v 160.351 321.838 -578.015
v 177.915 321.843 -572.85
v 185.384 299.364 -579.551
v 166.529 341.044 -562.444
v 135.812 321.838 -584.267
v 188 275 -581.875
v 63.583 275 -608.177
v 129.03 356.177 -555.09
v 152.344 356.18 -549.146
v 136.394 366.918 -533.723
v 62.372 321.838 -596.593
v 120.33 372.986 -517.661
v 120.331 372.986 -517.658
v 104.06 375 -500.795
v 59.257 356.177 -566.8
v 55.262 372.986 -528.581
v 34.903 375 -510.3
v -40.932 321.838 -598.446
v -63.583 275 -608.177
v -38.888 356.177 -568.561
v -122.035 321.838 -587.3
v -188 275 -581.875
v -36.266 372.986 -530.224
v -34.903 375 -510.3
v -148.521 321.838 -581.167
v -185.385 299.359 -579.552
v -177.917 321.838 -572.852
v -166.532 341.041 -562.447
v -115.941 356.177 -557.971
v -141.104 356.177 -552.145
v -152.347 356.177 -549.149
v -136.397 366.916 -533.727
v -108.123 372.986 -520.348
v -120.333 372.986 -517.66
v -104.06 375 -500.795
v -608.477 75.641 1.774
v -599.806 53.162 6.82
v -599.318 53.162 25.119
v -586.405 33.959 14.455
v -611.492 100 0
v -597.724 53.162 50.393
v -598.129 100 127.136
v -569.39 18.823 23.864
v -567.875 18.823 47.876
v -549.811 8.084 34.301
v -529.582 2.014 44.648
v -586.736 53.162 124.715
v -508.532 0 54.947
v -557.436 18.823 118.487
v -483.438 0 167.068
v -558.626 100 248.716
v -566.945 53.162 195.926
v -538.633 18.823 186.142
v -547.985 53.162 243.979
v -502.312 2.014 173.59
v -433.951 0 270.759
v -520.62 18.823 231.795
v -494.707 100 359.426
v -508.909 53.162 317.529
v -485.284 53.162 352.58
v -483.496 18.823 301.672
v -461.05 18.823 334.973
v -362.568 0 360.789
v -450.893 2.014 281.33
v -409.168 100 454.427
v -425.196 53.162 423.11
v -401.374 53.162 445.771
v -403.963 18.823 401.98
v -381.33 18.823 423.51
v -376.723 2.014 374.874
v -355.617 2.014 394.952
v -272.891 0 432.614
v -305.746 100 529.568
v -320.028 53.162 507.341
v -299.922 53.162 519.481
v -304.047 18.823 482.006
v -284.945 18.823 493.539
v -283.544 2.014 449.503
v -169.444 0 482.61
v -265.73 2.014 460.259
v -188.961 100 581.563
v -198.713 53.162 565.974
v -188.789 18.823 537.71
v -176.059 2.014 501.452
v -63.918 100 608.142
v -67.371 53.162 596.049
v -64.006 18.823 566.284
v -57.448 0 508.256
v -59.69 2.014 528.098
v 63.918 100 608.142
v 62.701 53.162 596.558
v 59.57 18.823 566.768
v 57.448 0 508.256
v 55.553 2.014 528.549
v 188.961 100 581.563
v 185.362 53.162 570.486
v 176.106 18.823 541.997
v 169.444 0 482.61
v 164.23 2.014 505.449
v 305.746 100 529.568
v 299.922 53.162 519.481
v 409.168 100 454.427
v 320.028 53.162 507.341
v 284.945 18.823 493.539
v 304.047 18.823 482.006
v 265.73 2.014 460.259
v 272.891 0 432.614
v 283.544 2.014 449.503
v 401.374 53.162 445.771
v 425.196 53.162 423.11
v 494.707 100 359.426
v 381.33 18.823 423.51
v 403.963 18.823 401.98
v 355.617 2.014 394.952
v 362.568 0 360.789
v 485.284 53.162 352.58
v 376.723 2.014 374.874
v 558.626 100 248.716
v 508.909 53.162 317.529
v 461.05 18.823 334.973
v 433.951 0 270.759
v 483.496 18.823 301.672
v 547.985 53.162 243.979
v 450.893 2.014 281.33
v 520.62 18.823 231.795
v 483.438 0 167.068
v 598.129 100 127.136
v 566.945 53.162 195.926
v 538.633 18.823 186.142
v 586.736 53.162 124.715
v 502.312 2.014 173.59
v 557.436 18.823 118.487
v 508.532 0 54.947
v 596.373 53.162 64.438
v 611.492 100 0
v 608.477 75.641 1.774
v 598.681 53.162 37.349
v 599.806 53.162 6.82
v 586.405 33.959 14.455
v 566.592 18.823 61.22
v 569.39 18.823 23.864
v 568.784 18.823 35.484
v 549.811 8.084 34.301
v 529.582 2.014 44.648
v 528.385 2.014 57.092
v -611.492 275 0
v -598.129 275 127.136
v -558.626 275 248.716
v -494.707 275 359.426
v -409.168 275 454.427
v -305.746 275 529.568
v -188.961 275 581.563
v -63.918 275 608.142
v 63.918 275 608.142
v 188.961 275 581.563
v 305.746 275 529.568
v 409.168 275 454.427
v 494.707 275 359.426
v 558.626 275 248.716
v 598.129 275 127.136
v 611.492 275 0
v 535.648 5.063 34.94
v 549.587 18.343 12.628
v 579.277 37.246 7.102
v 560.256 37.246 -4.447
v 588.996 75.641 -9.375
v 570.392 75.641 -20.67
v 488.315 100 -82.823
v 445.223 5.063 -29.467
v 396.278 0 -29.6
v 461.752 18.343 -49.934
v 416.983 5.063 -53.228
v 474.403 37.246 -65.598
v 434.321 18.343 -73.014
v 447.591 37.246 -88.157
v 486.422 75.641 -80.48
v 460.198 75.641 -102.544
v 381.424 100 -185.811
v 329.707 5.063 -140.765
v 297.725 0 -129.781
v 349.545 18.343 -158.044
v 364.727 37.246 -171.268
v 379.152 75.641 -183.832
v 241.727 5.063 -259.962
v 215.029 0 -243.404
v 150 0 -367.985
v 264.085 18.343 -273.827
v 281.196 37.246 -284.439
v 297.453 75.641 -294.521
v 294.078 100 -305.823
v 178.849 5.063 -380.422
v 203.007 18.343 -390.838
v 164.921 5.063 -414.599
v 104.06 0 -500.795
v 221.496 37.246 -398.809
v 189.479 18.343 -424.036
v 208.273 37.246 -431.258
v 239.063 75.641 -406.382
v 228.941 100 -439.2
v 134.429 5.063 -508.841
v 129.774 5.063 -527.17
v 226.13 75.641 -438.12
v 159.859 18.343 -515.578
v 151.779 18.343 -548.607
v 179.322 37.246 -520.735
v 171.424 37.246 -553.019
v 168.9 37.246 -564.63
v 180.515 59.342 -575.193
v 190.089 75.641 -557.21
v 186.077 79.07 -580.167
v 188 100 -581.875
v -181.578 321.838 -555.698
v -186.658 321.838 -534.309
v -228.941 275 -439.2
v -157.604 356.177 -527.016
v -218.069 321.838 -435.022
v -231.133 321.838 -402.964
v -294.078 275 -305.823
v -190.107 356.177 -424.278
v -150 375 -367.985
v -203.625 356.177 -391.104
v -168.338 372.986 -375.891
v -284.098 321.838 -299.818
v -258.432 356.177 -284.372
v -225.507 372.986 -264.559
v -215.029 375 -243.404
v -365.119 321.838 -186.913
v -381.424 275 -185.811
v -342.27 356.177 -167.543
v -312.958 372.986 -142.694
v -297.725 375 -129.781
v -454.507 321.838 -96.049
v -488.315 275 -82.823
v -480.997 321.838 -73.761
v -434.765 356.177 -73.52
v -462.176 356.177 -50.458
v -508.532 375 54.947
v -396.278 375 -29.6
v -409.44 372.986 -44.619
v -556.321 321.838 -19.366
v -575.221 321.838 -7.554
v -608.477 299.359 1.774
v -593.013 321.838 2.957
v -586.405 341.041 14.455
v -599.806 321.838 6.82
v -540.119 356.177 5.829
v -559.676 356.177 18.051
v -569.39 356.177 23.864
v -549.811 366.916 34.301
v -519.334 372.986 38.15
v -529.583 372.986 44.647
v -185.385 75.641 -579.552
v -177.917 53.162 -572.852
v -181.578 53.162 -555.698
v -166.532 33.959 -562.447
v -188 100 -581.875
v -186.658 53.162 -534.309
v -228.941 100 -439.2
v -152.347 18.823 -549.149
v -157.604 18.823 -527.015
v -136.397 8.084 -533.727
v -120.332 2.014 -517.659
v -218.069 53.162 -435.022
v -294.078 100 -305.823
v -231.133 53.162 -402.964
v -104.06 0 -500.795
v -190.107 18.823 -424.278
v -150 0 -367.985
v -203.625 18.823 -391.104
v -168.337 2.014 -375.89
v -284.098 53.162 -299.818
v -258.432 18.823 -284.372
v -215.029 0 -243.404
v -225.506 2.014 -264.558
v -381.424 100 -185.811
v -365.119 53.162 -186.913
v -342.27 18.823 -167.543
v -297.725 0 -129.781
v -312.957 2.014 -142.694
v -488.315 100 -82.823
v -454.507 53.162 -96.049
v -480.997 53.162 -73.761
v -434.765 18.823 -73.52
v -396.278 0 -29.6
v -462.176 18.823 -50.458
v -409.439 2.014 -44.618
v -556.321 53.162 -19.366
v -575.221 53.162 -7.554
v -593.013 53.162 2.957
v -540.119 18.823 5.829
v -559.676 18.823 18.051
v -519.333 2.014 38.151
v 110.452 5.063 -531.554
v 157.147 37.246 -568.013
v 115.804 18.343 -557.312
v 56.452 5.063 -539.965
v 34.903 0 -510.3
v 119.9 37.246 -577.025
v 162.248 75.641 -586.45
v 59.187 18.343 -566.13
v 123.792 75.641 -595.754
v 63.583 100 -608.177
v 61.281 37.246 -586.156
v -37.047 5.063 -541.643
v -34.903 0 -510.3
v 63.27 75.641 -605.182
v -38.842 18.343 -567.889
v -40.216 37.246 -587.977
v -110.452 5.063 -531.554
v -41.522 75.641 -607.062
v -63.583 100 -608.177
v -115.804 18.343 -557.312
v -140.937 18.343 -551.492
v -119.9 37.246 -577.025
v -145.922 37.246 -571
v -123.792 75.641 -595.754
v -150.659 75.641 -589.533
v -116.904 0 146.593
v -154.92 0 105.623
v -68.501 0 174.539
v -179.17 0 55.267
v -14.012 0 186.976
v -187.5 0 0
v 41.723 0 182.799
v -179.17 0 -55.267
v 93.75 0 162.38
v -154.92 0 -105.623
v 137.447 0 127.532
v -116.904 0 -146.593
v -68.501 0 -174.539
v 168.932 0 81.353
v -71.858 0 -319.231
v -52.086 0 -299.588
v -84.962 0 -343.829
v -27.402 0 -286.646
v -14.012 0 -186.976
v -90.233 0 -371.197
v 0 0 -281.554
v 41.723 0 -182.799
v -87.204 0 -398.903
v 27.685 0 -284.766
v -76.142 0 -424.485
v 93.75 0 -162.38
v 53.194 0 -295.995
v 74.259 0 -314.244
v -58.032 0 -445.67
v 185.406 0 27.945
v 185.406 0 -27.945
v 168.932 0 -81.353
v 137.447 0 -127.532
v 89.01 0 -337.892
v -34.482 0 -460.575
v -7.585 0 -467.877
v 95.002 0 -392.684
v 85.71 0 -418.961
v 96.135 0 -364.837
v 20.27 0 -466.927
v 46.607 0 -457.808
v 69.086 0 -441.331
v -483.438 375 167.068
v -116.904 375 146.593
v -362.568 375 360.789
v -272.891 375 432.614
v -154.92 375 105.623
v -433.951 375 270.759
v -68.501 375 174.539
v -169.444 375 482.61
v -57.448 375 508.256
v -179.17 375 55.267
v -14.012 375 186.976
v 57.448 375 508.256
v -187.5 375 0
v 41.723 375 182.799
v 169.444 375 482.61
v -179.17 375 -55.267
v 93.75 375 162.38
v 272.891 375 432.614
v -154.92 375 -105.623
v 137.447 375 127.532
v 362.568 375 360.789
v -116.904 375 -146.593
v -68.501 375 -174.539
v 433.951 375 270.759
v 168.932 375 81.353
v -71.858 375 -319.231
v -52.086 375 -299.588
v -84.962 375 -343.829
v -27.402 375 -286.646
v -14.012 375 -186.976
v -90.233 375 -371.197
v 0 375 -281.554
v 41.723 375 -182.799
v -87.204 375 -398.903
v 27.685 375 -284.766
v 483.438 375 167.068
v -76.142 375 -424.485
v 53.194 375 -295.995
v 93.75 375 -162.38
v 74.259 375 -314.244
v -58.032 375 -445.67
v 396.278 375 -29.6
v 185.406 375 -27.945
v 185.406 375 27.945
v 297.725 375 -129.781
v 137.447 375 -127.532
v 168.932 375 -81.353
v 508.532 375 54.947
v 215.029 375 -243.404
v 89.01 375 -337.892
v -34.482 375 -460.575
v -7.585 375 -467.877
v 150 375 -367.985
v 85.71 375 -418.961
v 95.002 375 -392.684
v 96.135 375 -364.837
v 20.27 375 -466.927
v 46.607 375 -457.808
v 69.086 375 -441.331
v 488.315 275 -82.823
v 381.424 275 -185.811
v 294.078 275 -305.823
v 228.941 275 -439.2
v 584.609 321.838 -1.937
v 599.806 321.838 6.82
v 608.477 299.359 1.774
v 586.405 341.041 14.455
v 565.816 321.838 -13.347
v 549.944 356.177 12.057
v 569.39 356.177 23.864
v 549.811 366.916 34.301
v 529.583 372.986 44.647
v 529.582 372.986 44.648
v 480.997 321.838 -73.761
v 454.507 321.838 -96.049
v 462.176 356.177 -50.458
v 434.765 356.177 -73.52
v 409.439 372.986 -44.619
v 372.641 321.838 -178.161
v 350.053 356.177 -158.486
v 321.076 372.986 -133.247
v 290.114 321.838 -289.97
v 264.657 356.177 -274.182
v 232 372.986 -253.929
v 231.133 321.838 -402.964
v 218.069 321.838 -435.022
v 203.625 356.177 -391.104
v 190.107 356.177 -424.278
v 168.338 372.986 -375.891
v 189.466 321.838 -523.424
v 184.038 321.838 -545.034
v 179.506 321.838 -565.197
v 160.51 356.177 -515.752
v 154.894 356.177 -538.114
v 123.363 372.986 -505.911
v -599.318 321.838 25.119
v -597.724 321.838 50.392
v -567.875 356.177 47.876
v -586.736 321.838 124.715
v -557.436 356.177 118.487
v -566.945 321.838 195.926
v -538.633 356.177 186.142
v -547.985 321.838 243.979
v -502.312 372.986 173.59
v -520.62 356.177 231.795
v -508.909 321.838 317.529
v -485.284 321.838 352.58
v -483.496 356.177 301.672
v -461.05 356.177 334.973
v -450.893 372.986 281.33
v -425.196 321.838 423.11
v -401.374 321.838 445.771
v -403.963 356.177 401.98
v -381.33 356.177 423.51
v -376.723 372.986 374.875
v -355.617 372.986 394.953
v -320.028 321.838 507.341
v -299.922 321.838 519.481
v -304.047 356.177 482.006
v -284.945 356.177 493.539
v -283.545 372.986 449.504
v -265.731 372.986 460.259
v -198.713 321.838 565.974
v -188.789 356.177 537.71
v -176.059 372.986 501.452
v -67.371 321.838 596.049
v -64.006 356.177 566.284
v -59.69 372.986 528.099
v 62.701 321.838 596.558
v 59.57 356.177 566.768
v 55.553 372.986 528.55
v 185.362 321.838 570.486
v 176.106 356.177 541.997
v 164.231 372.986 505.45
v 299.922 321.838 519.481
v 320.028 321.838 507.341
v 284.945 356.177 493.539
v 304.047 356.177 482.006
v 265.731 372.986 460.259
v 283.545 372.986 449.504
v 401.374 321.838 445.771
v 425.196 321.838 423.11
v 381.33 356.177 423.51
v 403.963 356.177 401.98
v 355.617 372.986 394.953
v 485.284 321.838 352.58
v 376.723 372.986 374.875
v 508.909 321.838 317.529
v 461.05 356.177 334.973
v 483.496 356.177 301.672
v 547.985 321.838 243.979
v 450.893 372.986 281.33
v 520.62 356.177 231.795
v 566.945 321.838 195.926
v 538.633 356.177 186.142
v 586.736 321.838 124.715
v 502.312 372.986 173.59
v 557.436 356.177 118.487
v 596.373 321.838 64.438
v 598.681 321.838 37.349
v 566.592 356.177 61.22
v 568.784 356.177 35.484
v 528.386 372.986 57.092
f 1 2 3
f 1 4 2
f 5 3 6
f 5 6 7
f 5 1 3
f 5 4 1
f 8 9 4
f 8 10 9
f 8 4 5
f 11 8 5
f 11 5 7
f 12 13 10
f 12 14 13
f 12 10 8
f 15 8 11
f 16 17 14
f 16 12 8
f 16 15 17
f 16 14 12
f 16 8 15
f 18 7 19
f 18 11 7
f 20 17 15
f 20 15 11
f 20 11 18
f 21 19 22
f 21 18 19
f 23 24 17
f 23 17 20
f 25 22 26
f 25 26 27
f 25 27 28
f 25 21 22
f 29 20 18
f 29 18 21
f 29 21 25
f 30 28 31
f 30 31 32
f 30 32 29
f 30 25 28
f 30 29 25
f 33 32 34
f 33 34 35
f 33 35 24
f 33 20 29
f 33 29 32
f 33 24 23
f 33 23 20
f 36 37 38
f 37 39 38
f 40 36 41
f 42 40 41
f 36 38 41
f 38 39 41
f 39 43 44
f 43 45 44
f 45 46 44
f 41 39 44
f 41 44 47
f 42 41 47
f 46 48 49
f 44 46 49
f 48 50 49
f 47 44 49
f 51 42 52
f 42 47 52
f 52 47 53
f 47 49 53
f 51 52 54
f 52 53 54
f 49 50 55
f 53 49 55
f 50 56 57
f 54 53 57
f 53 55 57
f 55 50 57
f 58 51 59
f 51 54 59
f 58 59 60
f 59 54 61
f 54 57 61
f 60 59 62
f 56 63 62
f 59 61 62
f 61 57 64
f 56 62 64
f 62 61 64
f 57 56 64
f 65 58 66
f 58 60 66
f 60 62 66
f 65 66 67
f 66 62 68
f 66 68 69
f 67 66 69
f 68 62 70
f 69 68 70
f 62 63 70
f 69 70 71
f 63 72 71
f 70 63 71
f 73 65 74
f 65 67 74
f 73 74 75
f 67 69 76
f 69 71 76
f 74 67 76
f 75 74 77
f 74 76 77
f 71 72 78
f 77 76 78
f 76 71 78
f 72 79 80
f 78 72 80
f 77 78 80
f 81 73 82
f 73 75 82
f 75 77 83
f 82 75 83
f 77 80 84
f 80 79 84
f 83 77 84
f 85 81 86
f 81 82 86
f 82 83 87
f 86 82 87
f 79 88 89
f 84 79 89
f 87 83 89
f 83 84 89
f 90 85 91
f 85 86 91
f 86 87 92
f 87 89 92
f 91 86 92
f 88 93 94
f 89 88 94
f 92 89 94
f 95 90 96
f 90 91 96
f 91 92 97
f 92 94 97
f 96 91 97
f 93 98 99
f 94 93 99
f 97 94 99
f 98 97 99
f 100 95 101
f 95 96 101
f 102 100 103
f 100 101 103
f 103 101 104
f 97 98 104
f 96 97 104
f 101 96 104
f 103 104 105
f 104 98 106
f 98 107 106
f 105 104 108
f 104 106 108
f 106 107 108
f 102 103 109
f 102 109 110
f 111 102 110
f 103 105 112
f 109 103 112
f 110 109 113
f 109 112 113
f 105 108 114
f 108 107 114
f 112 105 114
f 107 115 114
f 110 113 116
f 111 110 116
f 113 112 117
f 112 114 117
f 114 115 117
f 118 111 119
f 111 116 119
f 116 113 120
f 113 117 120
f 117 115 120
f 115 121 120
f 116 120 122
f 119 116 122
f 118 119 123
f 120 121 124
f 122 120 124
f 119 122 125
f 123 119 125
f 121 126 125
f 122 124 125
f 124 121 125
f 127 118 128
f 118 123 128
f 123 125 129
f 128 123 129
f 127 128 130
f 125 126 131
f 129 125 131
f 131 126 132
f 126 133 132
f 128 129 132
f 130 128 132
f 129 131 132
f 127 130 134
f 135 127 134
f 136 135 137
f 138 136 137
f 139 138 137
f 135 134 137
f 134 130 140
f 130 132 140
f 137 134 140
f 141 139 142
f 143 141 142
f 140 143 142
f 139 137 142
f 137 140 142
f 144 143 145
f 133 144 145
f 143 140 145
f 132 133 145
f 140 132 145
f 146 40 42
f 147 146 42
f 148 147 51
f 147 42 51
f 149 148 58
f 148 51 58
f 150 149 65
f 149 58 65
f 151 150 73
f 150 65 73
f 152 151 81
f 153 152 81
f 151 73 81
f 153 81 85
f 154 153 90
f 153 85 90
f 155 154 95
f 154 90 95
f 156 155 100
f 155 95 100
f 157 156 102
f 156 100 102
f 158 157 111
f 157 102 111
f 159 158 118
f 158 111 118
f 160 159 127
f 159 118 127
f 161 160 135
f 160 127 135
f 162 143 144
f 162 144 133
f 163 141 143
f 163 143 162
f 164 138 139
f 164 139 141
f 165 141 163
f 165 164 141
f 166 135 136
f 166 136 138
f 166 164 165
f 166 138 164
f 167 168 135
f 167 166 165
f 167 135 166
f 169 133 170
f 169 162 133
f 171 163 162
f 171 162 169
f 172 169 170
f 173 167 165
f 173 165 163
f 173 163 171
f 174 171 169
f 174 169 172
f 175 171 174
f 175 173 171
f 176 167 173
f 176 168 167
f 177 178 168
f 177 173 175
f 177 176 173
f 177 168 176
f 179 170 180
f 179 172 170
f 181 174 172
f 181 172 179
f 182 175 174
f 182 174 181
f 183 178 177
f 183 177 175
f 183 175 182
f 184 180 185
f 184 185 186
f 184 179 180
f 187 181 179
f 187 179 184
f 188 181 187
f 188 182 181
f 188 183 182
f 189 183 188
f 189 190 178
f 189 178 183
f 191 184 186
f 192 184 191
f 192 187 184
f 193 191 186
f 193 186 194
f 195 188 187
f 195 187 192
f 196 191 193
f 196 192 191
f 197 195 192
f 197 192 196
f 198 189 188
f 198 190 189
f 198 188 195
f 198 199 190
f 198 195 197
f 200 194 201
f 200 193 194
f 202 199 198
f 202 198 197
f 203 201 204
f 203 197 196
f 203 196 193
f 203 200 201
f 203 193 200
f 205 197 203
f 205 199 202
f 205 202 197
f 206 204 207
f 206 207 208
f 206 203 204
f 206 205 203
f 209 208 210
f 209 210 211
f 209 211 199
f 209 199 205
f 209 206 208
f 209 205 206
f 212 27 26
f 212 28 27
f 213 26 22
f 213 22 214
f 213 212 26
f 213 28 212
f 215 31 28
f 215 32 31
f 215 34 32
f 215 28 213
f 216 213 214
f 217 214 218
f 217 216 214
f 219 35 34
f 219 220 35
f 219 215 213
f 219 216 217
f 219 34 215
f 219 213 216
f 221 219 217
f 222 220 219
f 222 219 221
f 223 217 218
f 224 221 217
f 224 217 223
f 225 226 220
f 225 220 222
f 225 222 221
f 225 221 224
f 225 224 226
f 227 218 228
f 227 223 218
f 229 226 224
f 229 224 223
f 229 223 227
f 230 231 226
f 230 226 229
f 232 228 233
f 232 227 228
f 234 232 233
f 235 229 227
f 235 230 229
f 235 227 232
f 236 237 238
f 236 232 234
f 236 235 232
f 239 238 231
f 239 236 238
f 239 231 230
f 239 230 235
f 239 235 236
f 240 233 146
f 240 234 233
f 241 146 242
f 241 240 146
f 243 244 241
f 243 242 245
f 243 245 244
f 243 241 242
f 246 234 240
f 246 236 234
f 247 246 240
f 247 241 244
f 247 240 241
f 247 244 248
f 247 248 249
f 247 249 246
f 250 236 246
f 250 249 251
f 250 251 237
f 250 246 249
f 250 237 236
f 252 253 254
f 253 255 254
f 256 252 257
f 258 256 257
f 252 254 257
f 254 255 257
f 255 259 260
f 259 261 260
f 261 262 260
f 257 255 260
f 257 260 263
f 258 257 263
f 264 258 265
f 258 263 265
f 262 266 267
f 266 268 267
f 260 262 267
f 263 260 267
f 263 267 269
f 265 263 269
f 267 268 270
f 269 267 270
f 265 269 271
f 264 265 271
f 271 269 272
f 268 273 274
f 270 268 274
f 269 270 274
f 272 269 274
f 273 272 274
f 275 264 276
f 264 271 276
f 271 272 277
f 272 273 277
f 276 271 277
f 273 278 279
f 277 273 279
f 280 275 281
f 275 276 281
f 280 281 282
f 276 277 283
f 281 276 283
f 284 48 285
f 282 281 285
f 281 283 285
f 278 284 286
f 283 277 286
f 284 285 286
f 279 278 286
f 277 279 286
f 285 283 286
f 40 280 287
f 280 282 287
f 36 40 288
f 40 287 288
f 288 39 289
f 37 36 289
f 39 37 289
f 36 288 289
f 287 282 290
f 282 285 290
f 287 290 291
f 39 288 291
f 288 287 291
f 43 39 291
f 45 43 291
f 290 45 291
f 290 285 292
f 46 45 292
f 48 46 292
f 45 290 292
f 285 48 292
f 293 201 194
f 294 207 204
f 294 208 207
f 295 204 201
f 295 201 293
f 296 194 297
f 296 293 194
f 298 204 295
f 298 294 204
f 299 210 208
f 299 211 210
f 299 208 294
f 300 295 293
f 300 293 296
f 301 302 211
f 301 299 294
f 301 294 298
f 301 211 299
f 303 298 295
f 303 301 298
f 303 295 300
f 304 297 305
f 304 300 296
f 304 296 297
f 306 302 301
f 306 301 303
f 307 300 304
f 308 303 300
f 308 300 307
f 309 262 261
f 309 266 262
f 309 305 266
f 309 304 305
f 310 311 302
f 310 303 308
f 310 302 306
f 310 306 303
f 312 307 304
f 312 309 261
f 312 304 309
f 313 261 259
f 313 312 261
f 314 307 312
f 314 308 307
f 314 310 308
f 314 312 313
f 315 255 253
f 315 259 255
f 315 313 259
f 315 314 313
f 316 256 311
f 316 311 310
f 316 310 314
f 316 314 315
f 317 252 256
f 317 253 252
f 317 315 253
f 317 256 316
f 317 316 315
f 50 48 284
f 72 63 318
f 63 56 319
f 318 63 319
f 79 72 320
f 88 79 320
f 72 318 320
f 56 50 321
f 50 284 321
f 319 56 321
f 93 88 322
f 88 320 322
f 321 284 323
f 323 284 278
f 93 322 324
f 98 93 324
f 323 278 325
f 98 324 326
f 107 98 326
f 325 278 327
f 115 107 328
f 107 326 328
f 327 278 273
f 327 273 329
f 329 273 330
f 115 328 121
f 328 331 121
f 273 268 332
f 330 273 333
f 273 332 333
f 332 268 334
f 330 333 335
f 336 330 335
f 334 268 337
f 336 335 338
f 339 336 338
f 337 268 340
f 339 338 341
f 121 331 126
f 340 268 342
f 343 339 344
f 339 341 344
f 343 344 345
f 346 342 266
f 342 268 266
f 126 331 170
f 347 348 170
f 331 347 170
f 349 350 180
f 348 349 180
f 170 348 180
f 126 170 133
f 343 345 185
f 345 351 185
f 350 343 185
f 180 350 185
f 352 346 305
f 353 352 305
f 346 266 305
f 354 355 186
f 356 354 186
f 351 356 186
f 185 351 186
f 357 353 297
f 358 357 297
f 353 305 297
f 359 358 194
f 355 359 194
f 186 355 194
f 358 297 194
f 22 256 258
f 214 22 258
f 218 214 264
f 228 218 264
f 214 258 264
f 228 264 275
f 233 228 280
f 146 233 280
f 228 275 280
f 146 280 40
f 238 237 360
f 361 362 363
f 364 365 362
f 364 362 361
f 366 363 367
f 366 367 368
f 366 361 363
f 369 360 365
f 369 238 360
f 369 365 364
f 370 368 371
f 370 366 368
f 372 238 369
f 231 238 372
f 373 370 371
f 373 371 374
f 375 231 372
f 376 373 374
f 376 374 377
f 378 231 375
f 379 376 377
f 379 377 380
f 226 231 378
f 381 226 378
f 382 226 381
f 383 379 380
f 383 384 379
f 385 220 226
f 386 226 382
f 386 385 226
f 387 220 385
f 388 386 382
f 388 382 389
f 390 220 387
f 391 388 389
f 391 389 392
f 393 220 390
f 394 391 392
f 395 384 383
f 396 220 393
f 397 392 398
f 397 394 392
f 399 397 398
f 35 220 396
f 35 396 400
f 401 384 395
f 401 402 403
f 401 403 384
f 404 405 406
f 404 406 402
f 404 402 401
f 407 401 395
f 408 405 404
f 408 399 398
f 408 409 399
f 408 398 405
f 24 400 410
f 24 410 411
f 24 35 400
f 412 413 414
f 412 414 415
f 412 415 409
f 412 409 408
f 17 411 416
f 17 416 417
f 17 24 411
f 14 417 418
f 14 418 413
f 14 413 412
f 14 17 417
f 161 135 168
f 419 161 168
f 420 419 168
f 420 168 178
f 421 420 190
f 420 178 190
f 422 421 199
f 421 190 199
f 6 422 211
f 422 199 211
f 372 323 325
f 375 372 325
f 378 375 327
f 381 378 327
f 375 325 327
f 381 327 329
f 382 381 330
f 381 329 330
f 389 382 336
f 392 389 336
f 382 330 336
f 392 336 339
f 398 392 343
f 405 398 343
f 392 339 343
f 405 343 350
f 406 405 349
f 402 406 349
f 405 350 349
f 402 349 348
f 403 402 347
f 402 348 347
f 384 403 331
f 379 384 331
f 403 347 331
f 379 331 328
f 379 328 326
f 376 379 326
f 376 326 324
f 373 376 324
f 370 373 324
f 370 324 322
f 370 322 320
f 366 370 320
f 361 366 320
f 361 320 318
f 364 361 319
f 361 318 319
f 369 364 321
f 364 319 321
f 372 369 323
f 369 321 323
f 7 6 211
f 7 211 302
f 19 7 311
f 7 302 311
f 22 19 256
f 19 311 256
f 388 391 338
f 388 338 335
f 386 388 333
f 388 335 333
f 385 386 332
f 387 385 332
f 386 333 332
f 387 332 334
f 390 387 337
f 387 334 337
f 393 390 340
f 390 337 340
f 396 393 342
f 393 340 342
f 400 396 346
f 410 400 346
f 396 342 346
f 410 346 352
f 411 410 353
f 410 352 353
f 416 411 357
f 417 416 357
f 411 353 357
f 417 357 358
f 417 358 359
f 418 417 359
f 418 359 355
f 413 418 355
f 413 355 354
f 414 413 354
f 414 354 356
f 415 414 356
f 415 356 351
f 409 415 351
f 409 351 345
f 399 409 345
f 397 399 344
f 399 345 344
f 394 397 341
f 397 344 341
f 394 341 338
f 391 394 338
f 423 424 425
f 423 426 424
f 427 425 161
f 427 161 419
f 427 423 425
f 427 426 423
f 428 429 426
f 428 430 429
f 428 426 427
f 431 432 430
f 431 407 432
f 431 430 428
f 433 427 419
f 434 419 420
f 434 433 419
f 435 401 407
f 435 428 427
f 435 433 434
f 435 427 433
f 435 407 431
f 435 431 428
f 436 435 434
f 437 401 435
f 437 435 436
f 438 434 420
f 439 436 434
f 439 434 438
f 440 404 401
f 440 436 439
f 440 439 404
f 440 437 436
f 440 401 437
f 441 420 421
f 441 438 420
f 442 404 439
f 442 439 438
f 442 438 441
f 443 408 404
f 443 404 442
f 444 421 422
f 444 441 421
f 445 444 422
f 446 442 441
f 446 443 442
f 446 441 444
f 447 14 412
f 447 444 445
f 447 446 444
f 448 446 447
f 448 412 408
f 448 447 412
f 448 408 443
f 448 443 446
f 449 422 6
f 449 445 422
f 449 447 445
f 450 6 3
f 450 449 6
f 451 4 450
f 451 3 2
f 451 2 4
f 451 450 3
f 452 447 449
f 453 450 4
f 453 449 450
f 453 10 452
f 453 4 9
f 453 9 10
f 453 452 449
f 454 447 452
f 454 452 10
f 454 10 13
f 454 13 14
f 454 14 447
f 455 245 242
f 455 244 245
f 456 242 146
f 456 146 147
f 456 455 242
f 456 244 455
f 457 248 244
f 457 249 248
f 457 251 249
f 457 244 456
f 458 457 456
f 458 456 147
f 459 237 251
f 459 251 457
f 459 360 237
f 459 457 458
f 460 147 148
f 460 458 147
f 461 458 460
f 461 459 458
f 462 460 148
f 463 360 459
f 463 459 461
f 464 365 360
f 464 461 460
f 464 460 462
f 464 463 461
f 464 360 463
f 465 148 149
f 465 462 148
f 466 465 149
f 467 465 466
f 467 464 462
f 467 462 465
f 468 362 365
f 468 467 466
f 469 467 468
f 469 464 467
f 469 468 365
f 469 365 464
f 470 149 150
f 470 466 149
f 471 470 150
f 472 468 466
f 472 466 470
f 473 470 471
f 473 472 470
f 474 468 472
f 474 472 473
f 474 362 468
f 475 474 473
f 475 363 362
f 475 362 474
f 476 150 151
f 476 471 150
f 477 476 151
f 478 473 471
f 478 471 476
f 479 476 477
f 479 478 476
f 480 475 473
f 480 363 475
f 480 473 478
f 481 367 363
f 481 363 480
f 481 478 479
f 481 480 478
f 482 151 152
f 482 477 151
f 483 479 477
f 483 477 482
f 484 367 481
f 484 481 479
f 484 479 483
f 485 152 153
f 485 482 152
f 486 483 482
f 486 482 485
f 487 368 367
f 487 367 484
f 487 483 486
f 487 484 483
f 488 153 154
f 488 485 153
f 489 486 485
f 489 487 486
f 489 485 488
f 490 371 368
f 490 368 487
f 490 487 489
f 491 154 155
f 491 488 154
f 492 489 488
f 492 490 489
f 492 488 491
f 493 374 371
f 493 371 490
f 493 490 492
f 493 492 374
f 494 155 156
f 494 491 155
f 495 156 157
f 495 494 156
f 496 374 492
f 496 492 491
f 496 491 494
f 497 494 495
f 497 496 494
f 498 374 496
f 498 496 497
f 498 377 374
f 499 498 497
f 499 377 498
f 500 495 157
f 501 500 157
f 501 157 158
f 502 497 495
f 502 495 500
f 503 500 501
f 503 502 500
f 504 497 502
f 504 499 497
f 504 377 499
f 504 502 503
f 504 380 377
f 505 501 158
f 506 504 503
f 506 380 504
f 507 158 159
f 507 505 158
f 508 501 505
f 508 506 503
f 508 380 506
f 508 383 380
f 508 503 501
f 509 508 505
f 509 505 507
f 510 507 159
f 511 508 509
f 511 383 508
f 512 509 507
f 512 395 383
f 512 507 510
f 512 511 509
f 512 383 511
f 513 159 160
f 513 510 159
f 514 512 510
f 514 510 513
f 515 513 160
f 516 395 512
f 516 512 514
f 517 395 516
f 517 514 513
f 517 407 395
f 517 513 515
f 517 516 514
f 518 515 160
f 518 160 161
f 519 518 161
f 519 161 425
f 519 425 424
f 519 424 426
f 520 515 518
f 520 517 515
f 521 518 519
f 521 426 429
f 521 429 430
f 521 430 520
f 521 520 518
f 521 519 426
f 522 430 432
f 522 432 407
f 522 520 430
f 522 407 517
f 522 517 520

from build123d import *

# Parameters (mm, degrees)
BOSS_EXTRUDE1_DEPTH = 375
FILLET1_R           = 100
FILLET2_R           = 100


with BuildPart() as part:
    # Sketch1 → Boss-Extrude1 (new body)
    with BuildSketch(Plane(origin=(0, 0, 0), x_dir=(1, 0, 0), z_dir=(0, 1, 0))):
        with BuildLine():
            ThreePointArc((-611.4919693133057, 0), (-432.39011814255474, -432.3901181425547), (-3.744e-14, -611.4919693133057))
            Line((0, -611.4919693133057), (0, -187.5))
            ThreePointArc((-1.86631e-12, -187.5), (-132.58252147247833, -132.58252147247697), (-187.5, 2.296e-14))
            Line((-187.5, 0), (-611.4919693133057, 0))
        make_face()
        with BuildLine():
            Line((0, -187.5), (0, -611.4919693133057))
            ThreePointArc((-3.744e-14, -611.4919693133057), (432.3901181425547, -432.39011814255474), (611.4919693133057, -7.489e-14))
            Line((611.4919693133057, 0), (187.5, 0))
            ThreePointArc((187.5, -4.592e-14), (132.58252147247705, -132.58252147247828), (-1.86631e-12, -187.5))
        make_face()
        with BuildLine():
            Line((187.5, 0), (611.4919693133057, 0))
            ThreePointArc((611.4919693133056, -2.2737e-13), (335.12599508158894, 243.9066567186602), (187.9999999999999, 581.8749251640463))
            ThreePointArc((188, 581.8749251640465), (95.15929973489084, 604.0423298152456), (0, 611.4919693133056))
            Line((0, 611.4919693133057), (0, 468.44559362451025))
            ThreePointArc((2.9354e-13, 468.44559362451025), (68.16635262601869, 442.2325840672666), (96.6892055692424, 375))
            ThreePointArc((96.6892055692424, 375), (68.16635262601865, 307.76741593273334), (2.7045e-13, 281.55440637548975))
            Line((0, 281.55440637548975), (0, 187.5))
            ThreePointArc((-1.90365e-12, 187.5), (132.58252147247697, 132.58252147247833), (187.5, 0))
        make_face()
        with BuildLine():
            ThreePointArc((-188, 581.8749251640467), (-335.1259950815888, 243.90665671866032), (-611.4919693133057, 0))
            Line((-611.4919693133057, 0), (-187.5, 0))
            ThreePointArc((-187.5, 2.296e-14), (-132.5825214724783, 132.58252147247703), (-1.90365e-12, 187.5))
            Line((0, 187.5), (0, 281.55440637548975))
            ThreePointArc((2.7045e-13, 281.55440637548975), (-90.3107944307576, 375), (2.9354e-13, 468.44559362451025))
            Line((0, 468.44559362451025), (0, 611.4919693133057))
            ThreePointArc((0, 611.4919693133056), (-95.15929973489085, 604.0423298152457), (-188.00000000000003, 581.8749251640465))
        make_face()
    extrude(amount=BOSS_EXTRUDE1_DEPTH)

    # Fillet1
    fillet1_edges = [part.edges().sort_by_distance(p)[0] for p in [
        (-335.12599508158894, 375, -243.90665671866043),
        (-3.111e-14, 375, 611.4919693133057),
        (335.12599508158894, 375, -243.9066567186602),
        (-7.11e-15, 375, -611.4919693133056),
    ]]
    fillet(fillet1_edges, radius=FILLET1_R)

    # Fillet2
    fillet2_edges = [part.edges().sort_by_distance(p)[0] for p in [
        (-1.027e-14, 0, 611.4919693133057),
        (-335.12599508158894, 0, -243.90665671866043),
        (-2.132e-14, 0, -611.4919693133056),
        (335.12599508158894, 0, -243.9066567186602),
    ]]
    fillet(fillet2_edges, radius=FILLET2_R)


solid = part.part
